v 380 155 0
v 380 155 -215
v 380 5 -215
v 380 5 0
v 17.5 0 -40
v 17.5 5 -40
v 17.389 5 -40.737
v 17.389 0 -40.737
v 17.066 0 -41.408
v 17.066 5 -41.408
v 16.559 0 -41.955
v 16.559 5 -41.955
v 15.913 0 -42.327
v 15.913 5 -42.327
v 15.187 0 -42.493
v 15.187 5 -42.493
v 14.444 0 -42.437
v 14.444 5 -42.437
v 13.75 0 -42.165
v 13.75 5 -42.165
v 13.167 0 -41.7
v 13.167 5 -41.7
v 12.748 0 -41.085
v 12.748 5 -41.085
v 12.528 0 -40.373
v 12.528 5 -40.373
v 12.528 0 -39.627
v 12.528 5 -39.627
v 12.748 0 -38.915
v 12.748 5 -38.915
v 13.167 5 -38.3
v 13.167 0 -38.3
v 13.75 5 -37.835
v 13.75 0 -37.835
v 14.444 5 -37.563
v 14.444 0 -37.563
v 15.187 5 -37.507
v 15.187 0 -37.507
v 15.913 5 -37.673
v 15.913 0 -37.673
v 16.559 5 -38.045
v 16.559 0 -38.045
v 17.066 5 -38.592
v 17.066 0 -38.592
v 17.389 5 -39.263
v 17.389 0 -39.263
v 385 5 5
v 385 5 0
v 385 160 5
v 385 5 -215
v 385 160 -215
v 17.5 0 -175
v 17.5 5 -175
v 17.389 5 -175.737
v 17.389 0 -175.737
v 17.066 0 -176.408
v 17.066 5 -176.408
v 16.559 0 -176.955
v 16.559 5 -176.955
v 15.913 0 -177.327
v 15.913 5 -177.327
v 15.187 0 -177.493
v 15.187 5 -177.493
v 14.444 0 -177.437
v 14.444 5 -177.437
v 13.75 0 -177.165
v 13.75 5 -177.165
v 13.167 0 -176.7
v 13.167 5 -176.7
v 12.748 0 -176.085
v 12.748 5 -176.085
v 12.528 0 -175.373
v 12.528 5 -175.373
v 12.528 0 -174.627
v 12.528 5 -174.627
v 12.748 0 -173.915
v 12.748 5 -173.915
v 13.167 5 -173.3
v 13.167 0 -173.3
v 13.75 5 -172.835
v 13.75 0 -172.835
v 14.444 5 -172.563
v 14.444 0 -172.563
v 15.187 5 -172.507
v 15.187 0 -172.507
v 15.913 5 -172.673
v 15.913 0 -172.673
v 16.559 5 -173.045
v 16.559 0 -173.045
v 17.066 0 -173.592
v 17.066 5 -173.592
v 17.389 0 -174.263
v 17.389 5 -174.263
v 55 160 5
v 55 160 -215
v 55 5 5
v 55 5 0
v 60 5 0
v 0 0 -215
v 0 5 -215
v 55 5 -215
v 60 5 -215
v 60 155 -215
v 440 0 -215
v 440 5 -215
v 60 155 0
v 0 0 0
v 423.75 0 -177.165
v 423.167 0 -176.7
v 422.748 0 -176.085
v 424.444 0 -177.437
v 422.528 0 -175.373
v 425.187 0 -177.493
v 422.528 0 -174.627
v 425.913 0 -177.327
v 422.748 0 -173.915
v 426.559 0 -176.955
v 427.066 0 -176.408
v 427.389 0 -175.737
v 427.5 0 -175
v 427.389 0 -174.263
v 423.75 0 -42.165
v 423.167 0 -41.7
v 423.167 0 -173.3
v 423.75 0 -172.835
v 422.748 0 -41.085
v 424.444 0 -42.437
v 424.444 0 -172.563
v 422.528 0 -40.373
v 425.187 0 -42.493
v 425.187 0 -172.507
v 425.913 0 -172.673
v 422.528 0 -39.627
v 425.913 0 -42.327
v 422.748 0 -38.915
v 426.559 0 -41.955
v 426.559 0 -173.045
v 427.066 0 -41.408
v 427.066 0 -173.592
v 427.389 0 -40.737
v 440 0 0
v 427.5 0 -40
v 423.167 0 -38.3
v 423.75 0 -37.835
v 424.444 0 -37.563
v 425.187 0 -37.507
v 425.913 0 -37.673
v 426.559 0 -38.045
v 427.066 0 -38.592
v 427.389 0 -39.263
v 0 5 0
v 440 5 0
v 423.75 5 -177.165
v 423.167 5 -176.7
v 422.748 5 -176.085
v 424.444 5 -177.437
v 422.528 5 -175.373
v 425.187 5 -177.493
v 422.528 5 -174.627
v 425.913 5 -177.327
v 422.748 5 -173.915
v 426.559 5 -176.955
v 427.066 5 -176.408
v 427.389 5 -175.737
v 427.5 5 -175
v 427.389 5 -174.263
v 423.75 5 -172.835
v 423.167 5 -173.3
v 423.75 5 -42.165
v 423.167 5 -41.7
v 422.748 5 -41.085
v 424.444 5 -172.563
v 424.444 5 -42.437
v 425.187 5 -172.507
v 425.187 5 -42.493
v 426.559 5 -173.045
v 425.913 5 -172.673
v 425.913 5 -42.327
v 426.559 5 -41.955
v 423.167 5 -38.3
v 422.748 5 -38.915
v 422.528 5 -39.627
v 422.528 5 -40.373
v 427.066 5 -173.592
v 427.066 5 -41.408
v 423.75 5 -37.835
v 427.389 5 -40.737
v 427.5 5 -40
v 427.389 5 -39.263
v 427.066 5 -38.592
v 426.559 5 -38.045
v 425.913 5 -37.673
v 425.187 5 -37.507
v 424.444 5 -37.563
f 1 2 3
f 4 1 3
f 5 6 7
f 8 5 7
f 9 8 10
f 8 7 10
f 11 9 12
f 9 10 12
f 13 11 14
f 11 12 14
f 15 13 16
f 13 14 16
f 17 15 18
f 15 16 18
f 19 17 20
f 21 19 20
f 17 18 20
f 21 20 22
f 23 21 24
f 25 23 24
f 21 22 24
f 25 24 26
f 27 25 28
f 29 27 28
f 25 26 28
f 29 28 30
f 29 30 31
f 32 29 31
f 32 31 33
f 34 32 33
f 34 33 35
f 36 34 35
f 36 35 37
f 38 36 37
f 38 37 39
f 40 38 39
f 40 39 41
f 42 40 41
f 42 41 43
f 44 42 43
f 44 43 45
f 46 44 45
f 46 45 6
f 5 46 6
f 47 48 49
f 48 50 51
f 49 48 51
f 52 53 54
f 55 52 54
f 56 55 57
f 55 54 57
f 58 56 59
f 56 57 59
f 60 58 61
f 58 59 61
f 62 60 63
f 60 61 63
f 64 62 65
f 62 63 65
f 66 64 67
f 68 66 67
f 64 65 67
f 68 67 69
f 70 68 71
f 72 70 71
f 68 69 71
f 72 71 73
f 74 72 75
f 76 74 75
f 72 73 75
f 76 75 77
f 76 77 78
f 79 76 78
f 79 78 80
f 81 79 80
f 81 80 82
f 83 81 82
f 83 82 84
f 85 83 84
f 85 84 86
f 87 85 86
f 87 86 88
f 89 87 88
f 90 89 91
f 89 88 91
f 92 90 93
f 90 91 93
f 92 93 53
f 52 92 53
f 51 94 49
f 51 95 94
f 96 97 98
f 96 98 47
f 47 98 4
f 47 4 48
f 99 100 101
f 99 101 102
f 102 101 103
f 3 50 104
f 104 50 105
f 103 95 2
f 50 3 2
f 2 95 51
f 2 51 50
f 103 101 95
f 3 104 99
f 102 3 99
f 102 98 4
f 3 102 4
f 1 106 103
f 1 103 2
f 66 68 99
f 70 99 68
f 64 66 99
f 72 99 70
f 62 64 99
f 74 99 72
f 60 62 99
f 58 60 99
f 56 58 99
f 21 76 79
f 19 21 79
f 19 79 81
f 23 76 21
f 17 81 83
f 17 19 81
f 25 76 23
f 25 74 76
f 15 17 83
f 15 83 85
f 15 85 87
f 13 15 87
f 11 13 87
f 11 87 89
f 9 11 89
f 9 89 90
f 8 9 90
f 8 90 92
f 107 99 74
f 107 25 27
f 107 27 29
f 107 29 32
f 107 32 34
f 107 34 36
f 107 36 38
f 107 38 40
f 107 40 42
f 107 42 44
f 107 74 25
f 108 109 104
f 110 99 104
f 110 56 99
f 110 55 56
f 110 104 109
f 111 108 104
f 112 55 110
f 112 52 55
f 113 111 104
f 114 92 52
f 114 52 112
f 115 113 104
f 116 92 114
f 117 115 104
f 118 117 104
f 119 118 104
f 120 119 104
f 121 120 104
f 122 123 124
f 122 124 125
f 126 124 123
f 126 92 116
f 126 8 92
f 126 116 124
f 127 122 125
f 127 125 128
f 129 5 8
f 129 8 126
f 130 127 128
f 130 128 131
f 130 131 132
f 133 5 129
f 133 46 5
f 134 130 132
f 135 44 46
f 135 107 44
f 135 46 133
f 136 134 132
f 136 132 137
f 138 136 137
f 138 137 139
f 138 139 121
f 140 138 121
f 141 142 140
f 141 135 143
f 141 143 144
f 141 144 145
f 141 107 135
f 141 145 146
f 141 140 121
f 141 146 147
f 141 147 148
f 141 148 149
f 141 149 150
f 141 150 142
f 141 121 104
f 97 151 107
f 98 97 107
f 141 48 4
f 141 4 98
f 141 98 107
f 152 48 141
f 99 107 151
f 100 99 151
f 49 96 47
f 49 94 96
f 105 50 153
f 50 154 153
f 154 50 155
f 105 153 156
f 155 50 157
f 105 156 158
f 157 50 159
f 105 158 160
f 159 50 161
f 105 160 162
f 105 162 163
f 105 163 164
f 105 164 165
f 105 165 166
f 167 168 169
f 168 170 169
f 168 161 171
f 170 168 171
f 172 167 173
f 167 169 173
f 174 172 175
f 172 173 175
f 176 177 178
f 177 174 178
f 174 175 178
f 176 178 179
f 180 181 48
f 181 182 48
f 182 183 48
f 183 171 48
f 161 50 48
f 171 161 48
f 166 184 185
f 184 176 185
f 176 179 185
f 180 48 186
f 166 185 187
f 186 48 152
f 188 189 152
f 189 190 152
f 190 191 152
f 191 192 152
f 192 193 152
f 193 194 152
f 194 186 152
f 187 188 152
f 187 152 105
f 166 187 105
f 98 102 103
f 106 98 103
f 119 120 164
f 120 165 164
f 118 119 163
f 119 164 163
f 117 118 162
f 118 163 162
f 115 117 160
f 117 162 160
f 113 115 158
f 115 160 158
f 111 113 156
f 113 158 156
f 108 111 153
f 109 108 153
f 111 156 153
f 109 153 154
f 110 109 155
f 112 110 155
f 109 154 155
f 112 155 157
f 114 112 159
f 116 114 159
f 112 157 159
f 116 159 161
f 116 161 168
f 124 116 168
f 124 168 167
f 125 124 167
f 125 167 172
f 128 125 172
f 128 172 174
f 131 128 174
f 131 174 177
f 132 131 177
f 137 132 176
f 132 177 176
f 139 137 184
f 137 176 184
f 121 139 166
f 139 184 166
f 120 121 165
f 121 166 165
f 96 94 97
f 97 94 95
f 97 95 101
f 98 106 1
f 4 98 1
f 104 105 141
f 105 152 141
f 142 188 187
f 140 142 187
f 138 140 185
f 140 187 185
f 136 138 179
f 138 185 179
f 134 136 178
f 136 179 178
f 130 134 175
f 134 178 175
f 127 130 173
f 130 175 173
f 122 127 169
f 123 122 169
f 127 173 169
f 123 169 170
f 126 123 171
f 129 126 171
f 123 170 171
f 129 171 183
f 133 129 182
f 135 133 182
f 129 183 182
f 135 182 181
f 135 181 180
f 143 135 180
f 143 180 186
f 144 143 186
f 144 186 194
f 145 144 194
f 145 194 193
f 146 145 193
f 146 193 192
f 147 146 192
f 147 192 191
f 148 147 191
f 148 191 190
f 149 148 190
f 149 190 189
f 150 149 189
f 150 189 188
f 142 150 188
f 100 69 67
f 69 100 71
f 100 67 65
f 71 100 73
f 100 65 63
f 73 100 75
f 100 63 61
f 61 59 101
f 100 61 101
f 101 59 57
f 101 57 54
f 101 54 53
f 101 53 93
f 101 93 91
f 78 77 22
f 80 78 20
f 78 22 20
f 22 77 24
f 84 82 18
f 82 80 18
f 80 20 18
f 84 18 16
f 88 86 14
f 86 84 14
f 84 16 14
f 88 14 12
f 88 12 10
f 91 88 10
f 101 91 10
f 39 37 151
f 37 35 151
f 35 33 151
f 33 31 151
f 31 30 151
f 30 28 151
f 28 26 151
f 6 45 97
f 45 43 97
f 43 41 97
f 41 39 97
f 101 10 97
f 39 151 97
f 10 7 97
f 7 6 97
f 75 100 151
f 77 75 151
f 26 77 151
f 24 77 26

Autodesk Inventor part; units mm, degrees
ref_plane "YZ Plane" through (0, 0, 0) normal (1, 0, 0) x (0, 1, 0)
ref_plane "XZ Plane" through (0, 0, 0) normal (0, 1, 0) x (-1, 0, 0)
ref_plane "XY Plane" through (0, 0, 0) normal (0, 0, 1) x (1, 0, 0)
sketch "Sketch1" plane through (0, 0, 0) normal (0, 0, 1) x (1, 0, 0)
  line L0 (0, 0) -> (440, 0)
  line L1 (220, 0) -> (380, 0)
  line L2 (220, 0) -> (60, 0)
  line L3 (60, 2.9881) -> (60, 155)
  line L4 (60, 155) -> (380, 155)
  line L5 (380, 155) -> (380, 0)
  line L6 (60, -5) -> (220, -5)
  line L7 (220, -5) -> (385, -5)
  line L8 (385, -5) -> (385, 160)
  line L9 (385, 160) -> (55, 160)
  line L10 (55, 160) -> (55, 2.9881)
  line L11 (0, 0) -> (0, 5)
  line L12 (0, 5) -> (440, 5)
  line L13 (440, 5) -> (440, 0)
  point P0 (385, 5)
  point P1 (55, 5)
  point P2 (380, 5)
  point P3 (60, 5)
  dimension "d0" = 440
  dimension "d1" = 160
  dimension "d2" = 160
  dimension "d4" = 5
  dimension "d5" = 5
  dimension "d16" = 150
extrude "Extrusion1" add sketch "Sketch1" against normal blind 215 contours L11 L12 L5 L0 | L10 L9 L8 L12 L5 L4 L3 | L5 L12 L8 L0 | L8 L12 L13 L0
sketch "Sketch2" plane through (0, 5, 0) normal (0, 1, 0) x (1, 0, 0)
  line L0 (0, 0) -> (0, 215) projected
  line L1 (0, 215) -> (15, 215)
  line L2 (440, 215) -> (0, 215) projected
  line L3 (15, 215) -> (15, -133.1496)
  line L4 (440, 215) -> (425, 215)
  line L5 (425, 215) -> (425, -133.1496)
  circle A0 centre (15, 175) radius 2.5
  circle A1 centre (15, 40) radius 2.5
  line L6 (55, 0) -> (0, 0) projected
  line L7 (220, 215) -> (220, -93.5309)
  circle A2 centre (425, 175) radius 2.5
  circle A3 centre (425, 40) radius 2.5
  dimension "d8" = 15
  dimension "d9" = 15
  dimension "d10" = 5
  dimension "d11" = 5
  dimension "d12" = 40
  dimension "d13" = 40
extrude "Extrusion2" cut sketch "Sketch2" against normal blind 215 contours A3 L5 | L5 A3 | A2 L5 | L5 A2 | A1 L3 | L3 A1 | A0 L3 | L3 A0
sketch "Sketch3" plane through (0, 0, 0) normal (0, 0, 1) x (1, 0, 0)
  line L0 (0, 5) -> (55, 5) projected
  line L1 (55, 160) -> (385, 160) projected
  line L2 (55, 5) -> (385, 5)
  line L3 (385, 5) -> (385, 160)
  line L4 (385, 160) -> (55, 160)
  line L5 (55, 160) -> (55, 5)
  point P0 (0, 0)
extrude "Extrusion3" add sketch "Sketch3" along normal blind 5
properties part number "Proteção de acrilico"
